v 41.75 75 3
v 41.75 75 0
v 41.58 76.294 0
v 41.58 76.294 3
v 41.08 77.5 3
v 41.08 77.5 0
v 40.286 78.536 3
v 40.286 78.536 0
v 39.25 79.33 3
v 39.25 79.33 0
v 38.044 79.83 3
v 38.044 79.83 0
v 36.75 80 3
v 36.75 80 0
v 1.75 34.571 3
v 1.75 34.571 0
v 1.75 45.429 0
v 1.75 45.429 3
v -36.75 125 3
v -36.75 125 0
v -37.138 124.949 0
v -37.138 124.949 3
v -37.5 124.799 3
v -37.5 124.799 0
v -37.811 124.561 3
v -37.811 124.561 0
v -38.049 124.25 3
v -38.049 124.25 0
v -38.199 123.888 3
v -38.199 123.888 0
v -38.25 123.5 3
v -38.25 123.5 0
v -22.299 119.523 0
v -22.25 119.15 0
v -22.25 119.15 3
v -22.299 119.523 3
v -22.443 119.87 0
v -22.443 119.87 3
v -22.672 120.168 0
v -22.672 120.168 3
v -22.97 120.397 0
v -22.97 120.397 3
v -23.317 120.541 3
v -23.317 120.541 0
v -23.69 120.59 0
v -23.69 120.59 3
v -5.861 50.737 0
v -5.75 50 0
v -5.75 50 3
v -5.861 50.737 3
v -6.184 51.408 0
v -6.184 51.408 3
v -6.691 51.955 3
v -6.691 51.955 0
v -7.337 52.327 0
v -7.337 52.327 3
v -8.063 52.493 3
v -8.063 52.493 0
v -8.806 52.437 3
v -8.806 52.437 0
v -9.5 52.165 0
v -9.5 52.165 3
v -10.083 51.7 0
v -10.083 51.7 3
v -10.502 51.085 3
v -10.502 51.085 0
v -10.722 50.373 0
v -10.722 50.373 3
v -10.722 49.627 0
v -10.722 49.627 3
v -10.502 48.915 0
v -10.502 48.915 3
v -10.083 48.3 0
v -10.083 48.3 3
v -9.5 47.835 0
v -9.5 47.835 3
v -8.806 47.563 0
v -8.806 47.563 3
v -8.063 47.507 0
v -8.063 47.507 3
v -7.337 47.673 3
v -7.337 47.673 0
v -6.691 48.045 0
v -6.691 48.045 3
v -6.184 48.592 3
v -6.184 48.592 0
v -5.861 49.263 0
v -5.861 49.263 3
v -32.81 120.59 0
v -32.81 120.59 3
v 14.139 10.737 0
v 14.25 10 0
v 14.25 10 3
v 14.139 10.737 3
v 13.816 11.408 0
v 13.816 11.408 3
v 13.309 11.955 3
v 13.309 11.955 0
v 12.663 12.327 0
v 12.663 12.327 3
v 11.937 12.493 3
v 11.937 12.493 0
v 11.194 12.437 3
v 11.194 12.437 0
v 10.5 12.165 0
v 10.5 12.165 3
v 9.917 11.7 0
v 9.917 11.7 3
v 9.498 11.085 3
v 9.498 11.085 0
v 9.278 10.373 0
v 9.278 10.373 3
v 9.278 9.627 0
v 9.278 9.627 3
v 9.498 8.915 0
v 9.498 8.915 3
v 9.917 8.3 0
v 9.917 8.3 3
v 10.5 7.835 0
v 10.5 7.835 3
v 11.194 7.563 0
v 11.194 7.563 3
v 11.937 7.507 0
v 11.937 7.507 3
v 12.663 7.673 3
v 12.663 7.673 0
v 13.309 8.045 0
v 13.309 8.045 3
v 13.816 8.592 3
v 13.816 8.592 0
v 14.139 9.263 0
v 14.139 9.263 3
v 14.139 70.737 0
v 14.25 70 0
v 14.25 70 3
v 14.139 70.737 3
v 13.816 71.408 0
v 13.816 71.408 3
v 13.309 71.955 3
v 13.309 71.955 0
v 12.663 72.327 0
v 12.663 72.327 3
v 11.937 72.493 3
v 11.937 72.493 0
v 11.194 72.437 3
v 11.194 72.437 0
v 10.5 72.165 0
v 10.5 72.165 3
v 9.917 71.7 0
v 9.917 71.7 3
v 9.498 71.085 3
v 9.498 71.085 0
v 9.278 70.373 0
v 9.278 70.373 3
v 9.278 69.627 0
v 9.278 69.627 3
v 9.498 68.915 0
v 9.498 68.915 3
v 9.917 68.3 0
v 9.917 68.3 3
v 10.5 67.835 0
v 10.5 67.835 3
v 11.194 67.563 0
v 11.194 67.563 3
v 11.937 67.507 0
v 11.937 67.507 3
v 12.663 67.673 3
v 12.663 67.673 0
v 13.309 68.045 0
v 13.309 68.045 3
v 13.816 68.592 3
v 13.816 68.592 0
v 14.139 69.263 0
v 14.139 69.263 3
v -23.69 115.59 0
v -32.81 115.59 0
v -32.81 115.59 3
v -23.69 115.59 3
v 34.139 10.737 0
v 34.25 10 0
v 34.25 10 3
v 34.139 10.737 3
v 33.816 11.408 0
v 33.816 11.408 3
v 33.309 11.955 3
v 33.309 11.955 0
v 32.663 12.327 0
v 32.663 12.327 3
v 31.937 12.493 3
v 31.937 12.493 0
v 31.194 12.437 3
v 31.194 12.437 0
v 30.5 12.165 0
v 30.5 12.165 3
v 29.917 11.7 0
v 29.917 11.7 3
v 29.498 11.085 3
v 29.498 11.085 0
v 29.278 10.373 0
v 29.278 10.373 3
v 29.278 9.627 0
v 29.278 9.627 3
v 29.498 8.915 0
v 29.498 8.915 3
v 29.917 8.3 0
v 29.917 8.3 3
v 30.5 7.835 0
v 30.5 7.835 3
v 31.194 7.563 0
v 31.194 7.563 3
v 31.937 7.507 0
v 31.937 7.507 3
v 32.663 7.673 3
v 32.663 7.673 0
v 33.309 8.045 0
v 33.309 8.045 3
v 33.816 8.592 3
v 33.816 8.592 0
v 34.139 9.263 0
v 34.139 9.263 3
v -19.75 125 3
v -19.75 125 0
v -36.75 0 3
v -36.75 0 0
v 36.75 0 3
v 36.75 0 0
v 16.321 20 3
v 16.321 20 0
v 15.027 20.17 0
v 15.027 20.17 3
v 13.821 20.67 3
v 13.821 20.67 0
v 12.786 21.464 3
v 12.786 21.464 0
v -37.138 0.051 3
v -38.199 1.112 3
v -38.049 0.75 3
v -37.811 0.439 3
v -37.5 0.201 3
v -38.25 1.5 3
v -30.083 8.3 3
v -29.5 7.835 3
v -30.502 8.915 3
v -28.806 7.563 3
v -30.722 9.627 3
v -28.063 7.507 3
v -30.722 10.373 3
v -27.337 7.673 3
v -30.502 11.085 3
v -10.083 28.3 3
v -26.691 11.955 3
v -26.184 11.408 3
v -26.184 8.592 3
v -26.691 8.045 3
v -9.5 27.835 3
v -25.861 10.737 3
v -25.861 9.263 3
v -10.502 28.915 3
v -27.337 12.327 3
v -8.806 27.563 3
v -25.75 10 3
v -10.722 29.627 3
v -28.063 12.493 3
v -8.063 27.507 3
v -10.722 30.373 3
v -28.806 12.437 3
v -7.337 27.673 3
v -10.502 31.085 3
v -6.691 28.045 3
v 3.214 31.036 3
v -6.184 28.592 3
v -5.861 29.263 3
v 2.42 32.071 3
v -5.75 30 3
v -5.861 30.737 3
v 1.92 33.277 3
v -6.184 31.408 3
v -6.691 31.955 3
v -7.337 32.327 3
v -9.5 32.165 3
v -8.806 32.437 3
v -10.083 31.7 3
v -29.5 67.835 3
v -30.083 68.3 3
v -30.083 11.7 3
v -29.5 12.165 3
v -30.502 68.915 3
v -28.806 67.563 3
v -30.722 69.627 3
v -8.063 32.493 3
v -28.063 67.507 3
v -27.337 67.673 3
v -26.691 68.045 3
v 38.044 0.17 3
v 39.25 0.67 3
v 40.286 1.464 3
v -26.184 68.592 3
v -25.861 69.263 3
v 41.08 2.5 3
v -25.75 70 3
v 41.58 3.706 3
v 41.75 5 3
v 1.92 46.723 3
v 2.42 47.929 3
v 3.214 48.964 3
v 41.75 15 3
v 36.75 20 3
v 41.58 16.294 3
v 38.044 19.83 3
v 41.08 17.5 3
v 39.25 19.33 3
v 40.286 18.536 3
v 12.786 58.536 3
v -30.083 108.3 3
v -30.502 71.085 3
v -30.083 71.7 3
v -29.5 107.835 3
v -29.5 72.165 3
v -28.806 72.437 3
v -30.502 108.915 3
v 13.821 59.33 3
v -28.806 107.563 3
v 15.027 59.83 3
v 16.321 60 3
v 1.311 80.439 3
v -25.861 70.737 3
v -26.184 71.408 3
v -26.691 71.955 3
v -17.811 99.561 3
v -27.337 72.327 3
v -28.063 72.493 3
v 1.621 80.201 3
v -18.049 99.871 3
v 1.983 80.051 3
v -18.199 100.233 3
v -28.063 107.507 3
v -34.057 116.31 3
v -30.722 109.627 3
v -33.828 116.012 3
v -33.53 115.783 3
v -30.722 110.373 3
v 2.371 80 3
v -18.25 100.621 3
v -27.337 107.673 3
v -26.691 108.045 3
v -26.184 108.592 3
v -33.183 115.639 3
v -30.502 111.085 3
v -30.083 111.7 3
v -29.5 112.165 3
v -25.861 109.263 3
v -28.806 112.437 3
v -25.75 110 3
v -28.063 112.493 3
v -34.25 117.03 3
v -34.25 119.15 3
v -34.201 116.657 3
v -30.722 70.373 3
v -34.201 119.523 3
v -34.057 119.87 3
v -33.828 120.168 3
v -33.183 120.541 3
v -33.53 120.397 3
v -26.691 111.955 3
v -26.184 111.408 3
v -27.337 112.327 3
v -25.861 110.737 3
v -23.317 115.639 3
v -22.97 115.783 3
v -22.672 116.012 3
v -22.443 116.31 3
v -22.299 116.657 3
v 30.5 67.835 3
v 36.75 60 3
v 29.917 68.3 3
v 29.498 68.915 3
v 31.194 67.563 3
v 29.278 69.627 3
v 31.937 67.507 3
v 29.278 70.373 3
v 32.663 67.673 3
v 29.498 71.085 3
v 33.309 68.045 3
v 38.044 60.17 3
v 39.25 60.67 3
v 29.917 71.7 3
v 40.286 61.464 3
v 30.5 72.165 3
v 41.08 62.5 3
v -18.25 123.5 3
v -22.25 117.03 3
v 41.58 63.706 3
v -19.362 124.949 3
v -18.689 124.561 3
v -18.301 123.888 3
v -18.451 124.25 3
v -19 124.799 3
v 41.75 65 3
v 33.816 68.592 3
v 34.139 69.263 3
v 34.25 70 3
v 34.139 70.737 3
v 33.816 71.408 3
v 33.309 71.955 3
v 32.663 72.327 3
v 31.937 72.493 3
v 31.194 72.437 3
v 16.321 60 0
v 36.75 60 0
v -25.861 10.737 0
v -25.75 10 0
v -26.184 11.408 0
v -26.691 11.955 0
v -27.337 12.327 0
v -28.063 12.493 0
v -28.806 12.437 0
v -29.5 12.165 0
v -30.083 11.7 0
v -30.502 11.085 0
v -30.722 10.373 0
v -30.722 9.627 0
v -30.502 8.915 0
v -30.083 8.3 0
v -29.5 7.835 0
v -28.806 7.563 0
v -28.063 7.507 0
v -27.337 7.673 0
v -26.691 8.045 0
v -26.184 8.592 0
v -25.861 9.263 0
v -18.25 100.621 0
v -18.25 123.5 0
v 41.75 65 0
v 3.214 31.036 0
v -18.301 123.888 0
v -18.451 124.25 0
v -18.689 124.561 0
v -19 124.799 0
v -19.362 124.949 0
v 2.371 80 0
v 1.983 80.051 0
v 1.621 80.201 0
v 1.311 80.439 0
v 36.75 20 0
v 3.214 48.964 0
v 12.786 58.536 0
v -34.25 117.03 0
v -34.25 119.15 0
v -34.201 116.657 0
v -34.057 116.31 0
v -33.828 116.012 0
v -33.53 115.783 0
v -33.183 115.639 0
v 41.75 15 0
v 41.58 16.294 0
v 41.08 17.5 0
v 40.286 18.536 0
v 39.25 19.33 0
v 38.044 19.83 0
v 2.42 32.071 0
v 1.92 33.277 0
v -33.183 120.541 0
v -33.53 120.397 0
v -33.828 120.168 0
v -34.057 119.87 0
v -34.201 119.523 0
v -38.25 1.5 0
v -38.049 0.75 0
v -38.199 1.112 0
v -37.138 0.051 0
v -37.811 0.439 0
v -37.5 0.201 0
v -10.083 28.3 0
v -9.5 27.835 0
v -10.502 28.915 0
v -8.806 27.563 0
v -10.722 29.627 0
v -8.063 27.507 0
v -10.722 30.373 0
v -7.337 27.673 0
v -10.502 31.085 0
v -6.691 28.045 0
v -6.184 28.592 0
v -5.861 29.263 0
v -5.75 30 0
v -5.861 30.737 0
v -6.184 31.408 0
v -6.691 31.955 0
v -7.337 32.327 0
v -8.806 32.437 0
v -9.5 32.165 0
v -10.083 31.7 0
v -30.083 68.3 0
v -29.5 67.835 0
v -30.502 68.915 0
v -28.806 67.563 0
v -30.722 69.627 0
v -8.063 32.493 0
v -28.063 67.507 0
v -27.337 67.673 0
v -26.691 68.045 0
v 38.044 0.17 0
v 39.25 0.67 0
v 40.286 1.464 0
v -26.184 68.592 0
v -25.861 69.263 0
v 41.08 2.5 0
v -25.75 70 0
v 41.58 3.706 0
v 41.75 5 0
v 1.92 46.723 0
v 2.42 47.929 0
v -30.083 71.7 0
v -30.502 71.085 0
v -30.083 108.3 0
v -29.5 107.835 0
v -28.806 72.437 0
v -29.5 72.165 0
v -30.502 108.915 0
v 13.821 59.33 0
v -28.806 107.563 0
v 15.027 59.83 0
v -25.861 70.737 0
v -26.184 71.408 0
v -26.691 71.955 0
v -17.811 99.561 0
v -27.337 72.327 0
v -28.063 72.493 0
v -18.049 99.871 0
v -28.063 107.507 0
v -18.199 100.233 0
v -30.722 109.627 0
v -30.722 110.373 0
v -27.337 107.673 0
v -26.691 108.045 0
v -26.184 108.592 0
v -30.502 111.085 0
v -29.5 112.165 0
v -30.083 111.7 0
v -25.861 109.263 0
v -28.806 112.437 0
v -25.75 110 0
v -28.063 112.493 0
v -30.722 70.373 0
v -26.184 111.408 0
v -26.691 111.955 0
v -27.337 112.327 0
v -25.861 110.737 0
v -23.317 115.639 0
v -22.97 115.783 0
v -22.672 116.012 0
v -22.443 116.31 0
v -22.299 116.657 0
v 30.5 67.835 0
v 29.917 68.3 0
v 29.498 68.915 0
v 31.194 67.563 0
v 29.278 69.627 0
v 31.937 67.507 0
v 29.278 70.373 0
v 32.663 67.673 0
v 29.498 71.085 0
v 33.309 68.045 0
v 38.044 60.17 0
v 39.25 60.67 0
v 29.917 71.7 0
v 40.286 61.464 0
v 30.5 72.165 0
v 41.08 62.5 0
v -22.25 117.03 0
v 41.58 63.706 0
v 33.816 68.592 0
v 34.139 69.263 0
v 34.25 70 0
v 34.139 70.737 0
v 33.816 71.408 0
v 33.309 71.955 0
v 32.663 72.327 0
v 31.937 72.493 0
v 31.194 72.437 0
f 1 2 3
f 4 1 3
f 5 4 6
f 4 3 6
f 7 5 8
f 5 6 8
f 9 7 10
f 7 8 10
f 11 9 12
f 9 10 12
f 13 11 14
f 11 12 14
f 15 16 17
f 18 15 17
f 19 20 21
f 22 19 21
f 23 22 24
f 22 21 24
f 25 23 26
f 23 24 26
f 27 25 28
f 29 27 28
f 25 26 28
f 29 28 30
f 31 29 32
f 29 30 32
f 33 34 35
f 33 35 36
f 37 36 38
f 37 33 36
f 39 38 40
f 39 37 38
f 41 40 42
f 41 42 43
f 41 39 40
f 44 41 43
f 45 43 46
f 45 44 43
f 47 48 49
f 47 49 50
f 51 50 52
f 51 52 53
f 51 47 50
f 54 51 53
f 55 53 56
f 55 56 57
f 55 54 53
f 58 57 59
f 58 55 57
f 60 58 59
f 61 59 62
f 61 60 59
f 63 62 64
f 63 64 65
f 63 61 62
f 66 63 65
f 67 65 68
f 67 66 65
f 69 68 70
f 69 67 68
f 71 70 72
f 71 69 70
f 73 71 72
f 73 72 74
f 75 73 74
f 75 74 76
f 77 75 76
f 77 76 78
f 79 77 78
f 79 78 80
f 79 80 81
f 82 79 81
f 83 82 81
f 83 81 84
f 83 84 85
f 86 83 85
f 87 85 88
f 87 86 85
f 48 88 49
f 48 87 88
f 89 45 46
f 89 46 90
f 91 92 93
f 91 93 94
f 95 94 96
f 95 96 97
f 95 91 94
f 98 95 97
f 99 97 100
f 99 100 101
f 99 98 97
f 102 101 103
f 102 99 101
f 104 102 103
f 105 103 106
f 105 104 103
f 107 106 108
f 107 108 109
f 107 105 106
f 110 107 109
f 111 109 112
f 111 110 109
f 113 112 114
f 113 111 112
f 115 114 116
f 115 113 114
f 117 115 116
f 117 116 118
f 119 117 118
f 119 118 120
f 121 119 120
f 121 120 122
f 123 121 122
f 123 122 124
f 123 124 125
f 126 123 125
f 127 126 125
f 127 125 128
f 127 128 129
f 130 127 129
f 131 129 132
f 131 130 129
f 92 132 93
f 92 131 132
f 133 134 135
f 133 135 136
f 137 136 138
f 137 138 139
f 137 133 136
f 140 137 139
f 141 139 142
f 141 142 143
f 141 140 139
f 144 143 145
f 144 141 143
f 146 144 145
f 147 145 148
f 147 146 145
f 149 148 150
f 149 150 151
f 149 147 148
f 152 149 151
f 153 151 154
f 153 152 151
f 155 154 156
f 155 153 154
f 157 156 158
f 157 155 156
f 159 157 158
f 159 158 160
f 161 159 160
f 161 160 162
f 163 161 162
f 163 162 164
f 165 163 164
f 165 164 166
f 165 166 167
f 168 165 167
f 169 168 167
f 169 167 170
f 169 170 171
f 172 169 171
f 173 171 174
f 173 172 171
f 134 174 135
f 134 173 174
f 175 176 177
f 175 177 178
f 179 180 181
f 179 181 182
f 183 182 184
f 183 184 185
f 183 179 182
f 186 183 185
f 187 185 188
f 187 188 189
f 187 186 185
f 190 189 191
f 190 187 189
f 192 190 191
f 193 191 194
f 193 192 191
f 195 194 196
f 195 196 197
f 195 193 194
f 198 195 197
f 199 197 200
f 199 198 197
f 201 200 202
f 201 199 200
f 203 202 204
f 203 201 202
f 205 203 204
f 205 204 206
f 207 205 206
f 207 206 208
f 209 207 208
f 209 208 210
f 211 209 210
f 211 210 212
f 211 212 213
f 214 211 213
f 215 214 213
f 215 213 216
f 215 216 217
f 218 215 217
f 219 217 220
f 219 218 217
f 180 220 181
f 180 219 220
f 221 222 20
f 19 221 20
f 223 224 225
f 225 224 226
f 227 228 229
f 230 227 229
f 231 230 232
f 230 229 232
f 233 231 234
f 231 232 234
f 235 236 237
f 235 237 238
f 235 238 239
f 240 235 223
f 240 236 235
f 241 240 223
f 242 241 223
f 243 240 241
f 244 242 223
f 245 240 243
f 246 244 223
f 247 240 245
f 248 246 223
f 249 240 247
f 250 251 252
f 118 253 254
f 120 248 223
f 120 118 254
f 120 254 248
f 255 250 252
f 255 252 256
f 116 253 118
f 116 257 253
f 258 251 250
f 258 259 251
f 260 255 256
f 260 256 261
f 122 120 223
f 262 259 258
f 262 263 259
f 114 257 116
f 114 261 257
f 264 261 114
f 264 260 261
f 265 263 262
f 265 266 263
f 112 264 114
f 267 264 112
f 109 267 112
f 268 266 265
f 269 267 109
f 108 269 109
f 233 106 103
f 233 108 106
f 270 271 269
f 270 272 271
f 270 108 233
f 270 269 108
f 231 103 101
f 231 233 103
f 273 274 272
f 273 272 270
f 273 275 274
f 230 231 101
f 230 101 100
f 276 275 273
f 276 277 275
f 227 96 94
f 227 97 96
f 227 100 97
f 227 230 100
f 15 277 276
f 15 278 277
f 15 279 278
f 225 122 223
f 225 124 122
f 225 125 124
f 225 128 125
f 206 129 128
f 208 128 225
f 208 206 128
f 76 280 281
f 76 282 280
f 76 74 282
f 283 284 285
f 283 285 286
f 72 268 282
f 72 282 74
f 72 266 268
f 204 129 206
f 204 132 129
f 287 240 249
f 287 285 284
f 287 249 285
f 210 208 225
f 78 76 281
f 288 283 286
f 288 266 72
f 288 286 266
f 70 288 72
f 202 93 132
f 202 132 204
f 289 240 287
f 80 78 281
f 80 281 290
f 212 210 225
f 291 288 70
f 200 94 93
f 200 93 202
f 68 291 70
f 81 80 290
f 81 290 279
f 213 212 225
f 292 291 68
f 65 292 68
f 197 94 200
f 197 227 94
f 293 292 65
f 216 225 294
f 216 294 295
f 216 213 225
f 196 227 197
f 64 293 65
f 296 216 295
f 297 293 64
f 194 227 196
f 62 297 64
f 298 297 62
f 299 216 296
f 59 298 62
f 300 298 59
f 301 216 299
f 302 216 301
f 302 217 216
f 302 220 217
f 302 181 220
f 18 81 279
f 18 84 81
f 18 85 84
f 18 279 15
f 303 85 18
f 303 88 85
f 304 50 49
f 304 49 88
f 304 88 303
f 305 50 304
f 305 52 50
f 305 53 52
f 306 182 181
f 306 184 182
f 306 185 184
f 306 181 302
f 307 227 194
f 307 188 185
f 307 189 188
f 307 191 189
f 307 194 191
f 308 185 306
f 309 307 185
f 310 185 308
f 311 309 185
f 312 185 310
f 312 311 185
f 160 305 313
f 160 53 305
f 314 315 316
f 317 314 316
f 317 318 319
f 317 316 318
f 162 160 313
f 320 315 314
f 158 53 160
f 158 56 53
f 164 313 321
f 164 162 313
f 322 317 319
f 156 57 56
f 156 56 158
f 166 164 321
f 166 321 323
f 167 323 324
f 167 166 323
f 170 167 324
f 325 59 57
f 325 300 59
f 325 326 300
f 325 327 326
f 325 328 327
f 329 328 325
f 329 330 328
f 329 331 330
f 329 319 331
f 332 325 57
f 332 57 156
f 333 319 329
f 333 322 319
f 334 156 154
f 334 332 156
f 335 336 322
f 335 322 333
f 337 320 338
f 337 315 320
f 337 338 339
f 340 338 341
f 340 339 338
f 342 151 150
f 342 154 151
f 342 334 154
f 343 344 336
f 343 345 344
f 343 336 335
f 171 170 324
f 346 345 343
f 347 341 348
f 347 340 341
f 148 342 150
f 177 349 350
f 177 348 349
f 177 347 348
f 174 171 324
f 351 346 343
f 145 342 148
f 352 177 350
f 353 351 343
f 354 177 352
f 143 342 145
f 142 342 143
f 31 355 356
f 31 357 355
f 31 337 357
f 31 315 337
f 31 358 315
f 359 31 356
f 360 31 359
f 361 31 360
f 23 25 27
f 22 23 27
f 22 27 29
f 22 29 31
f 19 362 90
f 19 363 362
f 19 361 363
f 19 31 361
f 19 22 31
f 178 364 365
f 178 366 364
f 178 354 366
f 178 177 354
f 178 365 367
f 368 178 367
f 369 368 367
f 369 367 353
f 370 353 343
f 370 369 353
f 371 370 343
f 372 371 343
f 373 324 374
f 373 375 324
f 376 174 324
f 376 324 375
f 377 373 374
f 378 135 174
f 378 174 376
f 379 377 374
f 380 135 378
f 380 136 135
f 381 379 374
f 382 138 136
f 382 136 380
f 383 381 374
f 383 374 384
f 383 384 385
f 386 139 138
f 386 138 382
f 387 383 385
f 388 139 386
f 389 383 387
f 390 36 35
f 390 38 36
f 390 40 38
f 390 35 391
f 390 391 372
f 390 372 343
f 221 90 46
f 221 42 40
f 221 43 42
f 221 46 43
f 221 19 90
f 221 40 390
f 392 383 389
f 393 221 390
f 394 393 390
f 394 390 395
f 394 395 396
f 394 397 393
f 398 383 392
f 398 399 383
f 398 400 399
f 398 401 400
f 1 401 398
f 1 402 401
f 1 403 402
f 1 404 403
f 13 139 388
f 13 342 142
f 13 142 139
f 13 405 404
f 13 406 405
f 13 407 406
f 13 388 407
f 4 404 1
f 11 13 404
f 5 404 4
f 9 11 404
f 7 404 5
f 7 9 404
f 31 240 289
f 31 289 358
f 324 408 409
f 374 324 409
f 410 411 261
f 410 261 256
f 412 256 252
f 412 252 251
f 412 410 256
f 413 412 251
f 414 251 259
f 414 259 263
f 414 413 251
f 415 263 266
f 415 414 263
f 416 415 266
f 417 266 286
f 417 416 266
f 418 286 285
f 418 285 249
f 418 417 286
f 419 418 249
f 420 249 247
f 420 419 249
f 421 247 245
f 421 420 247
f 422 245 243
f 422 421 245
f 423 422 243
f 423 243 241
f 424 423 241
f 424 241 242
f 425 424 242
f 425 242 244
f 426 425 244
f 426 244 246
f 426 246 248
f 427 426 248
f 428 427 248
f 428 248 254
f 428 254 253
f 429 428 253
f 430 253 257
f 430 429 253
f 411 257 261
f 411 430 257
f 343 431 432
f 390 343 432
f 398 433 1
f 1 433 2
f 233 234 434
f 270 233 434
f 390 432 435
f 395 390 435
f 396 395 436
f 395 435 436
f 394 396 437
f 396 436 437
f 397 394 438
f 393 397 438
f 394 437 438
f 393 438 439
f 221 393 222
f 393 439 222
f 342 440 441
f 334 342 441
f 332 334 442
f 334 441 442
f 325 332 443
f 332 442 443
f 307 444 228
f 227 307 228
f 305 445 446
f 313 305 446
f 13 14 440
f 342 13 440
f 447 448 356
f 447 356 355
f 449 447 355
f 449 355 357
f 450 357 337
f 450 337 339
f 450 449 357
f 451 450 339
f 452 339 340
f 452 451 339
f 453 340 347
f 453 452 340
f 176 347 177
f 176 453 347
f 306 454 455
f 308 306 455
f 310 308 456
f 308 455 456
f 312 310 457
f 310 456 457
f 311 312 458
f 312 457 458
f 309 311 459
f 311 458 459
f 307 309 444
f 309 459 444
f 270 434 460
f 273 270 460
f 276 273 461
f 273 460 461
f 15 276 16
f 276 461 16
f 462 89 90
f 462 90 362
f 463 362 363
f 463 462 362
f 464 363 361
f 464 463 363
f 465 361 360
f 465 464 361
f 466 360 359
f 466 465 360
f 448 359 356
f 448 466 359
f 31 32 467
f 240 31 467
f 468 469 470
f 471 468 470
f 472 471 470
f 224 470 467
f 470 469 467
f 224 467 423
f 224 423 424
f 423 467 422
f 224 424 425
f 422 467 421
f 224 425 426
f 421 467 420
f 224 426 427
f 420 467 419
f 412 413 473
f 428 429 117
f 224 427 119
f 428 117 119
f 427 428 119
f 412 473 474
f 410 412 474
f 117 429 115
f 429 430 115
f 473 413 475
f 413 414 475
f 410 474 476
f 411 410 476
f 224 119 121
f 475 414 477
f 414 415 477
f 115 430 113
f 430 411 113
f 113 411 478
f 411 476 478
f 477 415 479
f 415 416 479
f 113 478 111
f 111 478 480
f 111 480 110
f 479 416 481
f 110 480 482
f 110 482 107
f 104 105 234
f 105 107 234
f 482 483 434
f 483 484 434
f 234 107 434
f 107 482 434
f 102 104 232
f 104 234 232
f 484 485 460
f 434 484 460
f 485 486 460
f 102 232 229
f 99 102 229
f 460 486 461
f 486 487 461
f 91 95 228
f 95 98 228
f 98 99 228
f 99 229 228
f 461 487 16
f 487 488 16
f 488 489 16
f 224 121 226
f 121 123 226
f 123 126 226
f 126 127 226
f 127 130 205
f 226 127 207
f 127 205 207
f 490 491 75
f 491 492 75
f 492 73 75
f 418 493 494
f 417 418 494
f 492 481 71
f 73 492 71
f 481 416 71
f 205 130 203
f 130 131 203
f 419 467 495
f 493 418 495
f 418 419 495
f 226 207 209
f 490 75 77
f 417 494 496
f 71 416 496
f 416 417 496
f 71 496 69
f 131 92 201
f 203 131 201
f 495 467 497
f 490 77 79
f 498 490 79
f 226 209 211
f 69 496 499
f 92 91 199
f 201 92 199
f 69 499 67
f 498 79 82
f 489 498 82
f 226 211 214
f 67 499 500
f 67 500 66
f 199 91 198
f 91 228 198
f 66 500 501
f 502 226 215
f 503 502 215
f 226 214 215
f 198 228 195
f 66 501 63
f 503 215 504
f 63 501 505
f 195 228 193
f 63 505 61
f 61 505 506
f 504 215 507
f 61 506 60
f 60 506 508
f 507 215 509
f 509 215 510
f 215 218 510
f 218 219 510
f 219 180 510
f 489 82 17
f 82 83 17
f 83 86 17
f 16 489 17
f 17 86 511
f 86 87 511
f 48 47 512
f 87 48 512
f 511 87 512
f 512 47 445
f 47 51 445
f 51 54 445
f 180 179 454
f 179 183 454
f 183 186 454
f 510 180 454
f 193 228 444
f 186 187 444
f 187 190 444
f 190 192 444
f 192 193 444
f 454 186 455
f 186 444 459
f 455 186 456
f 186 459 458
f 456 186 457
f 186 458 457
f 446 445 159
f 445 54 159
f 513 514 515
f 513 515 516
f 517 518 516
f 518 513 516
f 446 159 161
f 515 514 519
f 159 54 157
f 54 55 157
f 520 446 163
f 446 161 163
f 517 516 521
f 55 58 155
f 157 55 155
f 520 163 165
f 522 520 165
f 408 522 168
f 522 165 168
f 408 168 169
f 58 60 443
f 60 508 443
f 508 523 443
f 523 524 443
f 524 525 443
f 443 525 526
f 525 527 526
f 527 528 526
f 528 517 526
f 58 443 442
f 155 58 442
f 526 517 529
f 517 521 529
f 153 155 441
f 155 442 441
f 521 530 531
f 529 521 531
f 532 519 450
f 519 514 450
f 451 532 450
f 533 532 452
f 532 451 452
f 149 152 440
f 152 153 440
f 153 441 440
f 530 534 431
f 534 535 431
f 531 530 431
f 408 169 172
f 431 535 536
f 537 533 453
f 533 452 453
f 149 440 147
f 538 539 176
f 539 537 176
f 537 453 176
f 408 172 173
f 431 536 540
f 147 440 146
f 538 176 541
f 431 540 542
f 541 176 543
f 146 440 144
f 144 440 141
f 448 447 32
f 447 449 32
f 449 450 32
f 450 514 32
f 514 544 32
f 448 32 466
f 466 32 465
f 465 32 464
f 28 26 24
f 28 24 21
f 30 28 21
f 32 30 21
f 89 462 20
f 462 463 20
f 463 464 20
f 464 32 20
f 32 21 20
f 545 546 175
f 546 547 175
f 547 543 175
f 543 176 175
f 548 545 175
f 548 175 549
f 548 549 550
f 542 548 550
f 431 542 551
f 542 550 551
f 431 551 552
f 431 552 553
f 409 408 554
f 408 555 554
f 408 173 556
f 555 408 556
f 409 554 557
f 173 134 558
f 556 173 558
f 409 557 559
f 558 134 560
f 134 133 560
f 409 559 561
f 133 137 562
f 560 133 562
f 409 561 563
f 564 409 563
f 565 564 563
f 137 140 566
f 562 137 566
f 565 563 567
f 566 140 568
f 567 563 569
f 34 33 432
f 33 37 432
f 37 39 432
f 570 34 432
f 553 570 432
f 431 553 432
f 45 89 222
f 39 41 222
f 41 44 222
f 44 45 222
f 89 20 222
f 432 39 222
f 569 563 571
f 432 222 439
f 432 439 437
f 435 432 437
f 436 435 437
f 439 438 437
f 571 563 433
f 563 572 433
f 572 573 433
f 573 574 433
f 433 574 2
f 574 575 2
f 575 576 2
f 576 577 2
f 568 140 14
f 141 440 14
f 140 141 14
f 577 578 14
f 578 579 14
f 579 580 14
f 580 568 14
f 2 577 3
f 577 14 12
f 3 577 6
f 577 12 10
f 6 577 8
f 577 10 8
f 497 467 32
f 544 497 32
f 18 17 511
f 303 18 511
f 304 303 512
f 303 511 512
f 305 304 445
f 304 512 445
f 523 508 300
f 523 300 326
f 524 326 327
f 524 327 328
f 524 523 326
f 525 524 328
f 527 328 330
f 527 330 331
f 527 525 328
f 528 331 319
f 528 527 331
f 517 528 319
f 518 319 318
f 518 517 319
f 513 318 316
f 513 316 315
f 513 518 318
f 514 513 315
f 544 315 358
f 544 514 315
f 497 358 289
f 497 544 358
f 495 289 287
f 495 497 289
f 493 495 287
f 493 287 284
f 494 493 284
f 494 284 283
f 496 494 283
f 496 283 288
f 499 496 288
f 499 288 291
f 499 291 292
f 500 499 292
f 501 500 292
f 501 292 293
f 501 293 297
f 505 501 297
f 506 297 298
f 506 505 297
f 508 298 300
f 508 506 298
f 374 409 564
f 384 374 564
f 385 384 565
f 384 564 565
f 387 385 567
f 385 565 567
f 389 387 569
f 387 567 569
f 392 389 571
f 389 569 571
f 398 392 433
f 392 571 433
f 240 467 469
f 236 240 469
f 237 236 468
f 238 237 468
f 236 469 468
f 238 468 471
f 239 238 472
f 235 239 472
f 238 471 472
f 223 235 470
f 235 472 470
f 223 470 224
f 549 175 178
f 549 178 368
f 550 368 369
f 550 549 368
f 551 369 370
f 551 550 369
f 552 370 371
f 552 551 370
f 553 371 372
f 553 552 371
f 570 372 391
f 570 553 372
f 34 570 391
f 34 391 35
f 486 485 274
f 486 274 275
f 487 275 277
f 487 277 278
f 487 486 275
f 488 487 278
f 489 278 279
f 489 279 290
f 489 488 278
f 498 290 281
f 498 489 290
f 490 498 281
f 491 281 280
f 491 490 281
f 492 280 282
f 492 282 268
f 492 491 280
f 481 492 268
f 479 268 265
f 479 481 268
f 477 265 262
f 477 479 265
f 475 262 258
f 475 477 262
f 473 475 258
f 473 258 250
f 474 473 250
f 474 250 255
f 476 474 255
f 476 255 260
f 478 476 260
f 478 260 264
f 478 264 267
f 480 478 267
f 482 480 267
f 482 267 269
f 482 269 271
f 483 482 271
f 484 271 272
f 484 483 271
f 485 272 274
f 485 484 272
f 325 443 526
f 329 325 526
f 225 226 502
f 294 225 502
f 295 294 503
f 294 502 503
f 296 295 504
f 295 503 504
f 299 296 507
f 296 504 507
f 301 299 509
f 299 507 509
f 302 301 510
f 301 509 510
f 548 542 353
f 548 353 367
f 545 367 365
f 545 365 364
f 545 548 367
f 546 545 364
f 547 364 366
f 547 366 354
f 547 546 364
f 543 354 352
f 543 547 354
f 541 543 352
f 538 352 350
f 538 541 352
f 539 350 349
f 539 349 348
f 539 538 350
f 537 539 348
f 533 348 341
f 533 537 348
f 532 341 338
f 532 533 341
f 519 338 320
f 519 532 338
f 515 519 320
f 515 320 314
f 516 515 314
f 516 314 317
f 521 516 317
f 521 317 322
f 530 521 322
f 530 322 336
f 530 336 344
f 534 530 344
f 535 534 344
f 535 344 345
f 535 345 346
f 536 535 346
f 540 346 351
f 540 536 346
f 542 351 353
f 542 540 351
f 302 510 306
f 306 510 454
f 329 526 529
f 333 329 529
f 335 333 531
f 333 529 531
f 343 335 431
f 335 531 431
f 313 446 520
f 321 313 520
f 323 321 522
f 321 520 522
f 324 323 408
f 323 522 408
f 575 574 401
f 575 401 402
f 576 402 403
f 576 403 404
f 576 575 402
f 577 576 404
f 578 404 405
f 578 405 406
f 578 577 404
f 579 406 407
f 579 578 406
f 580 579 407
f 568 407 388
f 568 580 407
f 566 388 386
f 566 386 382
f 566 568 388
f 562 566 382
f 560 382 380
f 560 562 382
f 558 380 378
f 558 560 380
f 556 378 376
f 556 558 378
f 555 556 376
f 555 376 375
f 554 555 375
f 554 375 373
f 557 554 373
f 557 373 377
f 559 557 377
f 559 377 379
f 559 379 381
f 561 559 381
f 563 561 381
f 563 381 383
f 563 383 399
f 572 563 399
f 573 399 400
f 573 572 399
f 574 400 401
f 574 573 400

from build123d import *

# Parameters (mm, degrees)
MODEL_R             = 2.5
BOSS_EXTRUDE1_DEPTH = 3


with BuildPart() as part:
    # Model → Boss-Extrude1 (new body)
    with BuildSketch(Plane.XY):
        with BuildLine():
            Line((-36.75, 0), (36.75, 0))
            ThreePointArc((36.75, 0), (40.285533906, 1.464466094), (41.75, 5))
            Line((41.75, 5), (41.75, 15))
            ThreePointArc((41.75, 15), (40.285533906, 18.535533906), (36.75, 20))
            Line((36.75, 20), (16.321067812, 20))
            ThreePointArc((16.321067812, 20), (14.40765065, 20.380602337), (12.785533906, 21.464466094))
            Line((12.785533906, 21.464466094), (3.214466094, 31.035533906))
            ThreePointArc((3.214466094, 31.035533906), (2.130602337, 32.65765065), (1.75, 34.571067812))
            Line((1.75, 34.571067812), (1.75, 45.428932188))
            ThreePointArc((1.75, 45.428932188), (2.130602337, 47.34234935), (3.214466094, 48.964466094))
            Line((3.214466094, 48.964466094), (12.785533906, 58.535533906))
            ThreePointArc((12.785533906, 58.535533906), (14.40765065, 59.619397663), (16.321067812, 60))
            Line((16.321067812, 60), (36.75, 60))
            ThreePointArc((36.75, 60), (40.285533906, 61.464466094), (41.75, 65))
            Line((41.75, 65), (41.75, 75))
            ThreePointArc((41.75, 75), (40.285533906, 78.535533906), (36.75, 80))
            Line((36.75, 80), (2.371320344, 80))
            ThreePointArc((2.371320344, 80), (1.797295195, 80.114180701), (1.310660172, 80.439339828))
            Line((1.310660172, 80.439339828), (-17.810660172, 99.560660172))
            ThreePointArc((-17.810660172, 99.560660172), (-18.135819299, 100.047295195), (-18.25, 100.621320344))
            Line((-18.25, 100.621320344), (-18.25, 123.5))
            ThreePointArc((-18.25, 123.5), (-18.689339828, 124.560660172), (-19.75, 125))
            Line((-19.75, 125), (-36.75, 125))
            ThreePointArc((-36.75, 125), (-37.810660172, 124.560660172), (-38.25, 123.5))
            Line((-38.25, 123.5), (-38.25, 1.5))
            ThreePointArc((-38.25, 1.5), (-37.810660172, 0.439339828), (-36.75, 0))
        make_face()
        with Locations((-28.25, 70)):
            Circle(MODEL_R, mode=Mode.SUBTRACT)
        with Locations((-8.25, 30)):
            Circle(MODEL_R, mode=Mode.SUBTRACT)
        with Locations((-8.25, 50)):
            Circle(MODEL_R, mode=Mode.SUBTRACT)
        with Locations((11.75, 70)):
            Circle(MODEL_R, mode=Mode.SUBTRACT)
        with Locations((31.75, 70)):
            Circle(MODEL_R, mode=Mode.SUBTRACT)
        with Locations((31.75, 10)):
            Circle(MODEL_R, mode=Mode.SUBTRACT)
        with Locations((11.75, 10)):
            Circle(MODEL_R, mode=Mode.SUBTRACT)
        with Locations((-28.25, 10)):
            Circle(MODEL_R, mode=Mode.SUBTRACT)
        with Locations((-28.25, 110)):
            Circle(MODEL_R, mode=Mode.SUBTRACT)
        with BuildLine():
            Line((-34.25, 119.15), (-34.25, 117.03))
            ThreePointArc((-34.25, 117.03), (-33.828233765, 116.011766235), (-32.81, 115.59))
            Line((-32.81, 115.59), (-23.69, 115.59))
            ThreePointArc((-23.69, 115.59), (-22.671766235, 116.011766235), (-22.25, 117.03))
            Line((-22.25, 117.03), (-22.25, 119.15))
            ThreePointArc((-22.25, 119.15), (-22.671766235, 120.168233765), (-23.69, 120.59))
            Line((-23.69, 120.59), (-32.81, 120.59))
            ThreePointArc((-32.81, 120.59), (-33.828233765, 120.168233765), (-34.25, 119.15))
        make_face(mode=Mode.SUBTRACT)
    extrude(amount=BOSS_EXTRUDE1_DEPTH)


solid = part.part
